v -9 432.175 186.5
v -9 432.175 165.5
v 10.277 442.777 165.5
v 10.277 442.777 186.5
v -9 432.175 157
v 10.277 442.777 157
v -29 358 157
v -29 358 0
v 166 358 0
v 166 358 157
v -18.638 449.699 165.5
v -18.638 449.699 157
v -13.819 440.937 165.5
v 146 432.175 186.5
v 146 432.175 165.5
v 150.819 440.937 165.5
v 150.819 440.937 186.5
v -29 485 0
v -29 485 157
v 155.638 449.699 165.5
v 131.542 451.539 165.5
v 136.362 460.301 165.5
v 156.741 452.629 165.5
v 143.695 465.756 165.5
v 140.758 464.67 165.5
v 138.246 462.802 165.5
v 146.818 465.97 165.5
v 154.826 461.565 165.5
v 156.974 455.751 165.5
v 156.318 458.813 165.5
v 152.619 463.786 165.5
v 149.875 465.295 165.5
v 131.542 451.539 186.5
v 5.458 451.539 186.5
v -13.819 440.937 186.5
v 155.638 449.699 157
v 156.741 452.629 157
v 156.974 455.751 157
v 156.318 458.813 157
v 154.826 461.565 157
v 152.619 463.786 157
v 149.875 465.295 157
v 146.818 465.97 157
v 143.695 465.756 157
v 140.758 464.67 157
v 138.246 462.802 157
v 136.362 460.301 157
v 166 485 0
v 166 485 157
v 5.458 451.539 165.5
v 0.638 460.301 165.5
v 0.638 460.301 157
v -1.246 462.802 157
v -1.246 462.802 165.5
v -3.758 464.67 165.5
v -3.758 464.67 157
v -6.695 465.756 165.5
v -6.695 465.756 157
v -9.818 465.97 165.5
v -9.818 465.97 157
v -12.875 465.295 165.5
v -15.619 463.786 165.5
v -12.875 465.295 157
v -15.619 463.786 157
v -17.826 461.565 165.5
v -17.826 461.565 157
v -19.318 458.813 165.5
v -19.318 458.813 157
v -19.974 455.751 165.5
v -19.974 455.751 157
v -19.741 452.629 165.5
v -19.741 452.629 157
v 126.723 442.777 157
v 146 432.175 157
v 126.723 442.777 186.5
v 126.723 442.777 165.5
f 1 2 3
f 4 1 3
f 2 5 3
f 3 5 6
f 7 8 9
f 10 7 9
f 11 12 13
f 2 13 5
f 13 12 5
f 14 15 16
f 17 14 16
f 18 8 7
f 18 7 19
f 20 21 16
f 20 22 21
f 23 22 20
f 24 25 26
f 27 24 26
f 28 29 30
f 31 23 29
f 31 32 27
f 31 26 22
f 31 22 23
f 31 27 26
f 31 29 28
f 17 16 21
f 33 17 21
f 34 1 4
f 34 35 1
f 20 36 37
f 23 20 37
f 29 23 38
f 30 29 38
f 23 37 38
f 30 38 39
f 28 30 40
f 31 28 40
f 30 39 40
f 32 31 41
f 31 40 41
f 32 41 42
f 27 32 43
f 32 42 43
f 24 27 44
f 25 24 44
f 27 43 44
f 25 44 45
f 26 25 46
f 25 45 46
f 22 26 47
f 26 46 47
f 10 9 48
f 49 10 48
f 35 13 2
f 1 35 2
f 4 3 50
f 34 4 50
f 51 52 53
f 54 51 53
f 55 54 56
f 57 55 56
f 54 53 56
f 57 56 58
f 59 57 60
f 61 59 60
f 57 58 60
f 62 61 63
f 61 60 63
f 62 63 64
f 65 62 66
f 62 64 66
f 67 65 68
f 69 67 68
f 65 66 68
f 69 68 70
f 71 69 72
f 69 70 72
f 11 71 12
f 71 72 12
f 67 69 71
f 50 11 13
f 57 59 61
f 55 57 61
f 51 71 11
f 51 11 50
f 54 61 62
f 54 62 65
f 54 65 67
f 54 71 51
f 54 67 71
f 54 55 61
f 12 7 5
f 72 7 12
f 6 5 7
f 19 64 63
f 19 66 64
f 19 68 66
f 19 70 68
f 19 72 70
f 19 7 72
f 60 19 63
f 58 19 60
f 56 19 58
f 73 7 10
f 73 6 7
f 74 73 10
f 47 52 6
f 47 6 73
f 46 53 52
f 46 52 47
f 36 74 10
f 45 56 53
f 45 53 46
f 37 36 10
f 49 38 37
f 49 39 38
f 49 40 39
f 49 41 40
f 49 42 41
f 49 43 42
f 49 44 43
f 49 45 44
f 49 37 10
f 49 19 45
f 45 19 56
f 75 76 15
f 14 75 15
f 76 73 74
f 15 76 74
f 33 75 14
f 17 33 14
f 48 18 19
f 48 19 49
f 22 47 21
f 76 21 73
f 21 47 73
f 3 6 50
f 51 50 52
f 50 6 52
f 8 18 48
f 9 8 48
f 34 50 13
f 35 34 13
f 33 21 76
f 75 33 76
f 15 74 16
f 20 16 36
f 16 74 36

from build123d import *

# Parameters (mm, degrees)
SKETCH016_W  = 195
SKETCH016_H  = 127
PAD012_DEPTH = 157
PAD013_DEPTH = 8.5
PAD014_DEPTH = 21


with BuildPart() as part:
    # Sketch016 → Pad012 (new body)
    with BuildSketch(Plane.XY):
        with Locations((97.5, -63.5)):
            Rectangle(SKETCH016_W, SKETCH016_H)
    extrude(amount=PAD012_DEPTH)

    # Sketch017 (on Face6 of Pad012) → Pad013 (join)
    with BuildSketch(Plane.XY.offset(157)):
        with BuildLine():
            ThreePointArc((29.6383749954, -24.6988937525), (14.6988937525, -20.3616250046), (10.3616250046, -35.3011062475))
            Line((10.3616250046, -35.3011062475), (20, -52.825424421))
            Line((20, -52.825424421), (39.2767499909, -42.223211926))
            Line((39.2767499909, -42.223211926), (29.6383749954, -24.6988937525))
        make_face()
        with BuildLine():
            Line((175, -52.825424421), (184.6383749954, -35.3011062475))
            ThreePointArc((184.6383749954, -35.3011062475), (180.3011062475, -20.3616250046), (165.3616250046, -24.6988937525))
            Line((165.3616250046, -24.6988937525), (155.7232500091, -42.223211926))
            Line((155.7232500091, -42.223211926), (175, -52.825424421))
        make_face()
    extrude(amount=PAD013_DEPTH)

    # Sketch018 (on Face15 of Pad013) → Pad014 (join)
    with BuildSketch(Plane.XY.offset(165.5)):
        Polygon((20, -52.825424421), (39.2767499909, -42.223211926), (34.4575624932, -33.4610528393), (15.1808125023, -44.0632653343), align=None)
        Polygon((155.7232500091, -42.223211926), (175, -52.825424421), (179.8191874977, -44.0632653343), (160.5424375068, -33.4610528393), align=None)
    extrude(amount=PAD014_DEPTH)


with BuildPart() as part_1:
    # Body005 placement: moved
    add(part.part.moved(Location((-29, 485, 0))))


solid = part_1.part
